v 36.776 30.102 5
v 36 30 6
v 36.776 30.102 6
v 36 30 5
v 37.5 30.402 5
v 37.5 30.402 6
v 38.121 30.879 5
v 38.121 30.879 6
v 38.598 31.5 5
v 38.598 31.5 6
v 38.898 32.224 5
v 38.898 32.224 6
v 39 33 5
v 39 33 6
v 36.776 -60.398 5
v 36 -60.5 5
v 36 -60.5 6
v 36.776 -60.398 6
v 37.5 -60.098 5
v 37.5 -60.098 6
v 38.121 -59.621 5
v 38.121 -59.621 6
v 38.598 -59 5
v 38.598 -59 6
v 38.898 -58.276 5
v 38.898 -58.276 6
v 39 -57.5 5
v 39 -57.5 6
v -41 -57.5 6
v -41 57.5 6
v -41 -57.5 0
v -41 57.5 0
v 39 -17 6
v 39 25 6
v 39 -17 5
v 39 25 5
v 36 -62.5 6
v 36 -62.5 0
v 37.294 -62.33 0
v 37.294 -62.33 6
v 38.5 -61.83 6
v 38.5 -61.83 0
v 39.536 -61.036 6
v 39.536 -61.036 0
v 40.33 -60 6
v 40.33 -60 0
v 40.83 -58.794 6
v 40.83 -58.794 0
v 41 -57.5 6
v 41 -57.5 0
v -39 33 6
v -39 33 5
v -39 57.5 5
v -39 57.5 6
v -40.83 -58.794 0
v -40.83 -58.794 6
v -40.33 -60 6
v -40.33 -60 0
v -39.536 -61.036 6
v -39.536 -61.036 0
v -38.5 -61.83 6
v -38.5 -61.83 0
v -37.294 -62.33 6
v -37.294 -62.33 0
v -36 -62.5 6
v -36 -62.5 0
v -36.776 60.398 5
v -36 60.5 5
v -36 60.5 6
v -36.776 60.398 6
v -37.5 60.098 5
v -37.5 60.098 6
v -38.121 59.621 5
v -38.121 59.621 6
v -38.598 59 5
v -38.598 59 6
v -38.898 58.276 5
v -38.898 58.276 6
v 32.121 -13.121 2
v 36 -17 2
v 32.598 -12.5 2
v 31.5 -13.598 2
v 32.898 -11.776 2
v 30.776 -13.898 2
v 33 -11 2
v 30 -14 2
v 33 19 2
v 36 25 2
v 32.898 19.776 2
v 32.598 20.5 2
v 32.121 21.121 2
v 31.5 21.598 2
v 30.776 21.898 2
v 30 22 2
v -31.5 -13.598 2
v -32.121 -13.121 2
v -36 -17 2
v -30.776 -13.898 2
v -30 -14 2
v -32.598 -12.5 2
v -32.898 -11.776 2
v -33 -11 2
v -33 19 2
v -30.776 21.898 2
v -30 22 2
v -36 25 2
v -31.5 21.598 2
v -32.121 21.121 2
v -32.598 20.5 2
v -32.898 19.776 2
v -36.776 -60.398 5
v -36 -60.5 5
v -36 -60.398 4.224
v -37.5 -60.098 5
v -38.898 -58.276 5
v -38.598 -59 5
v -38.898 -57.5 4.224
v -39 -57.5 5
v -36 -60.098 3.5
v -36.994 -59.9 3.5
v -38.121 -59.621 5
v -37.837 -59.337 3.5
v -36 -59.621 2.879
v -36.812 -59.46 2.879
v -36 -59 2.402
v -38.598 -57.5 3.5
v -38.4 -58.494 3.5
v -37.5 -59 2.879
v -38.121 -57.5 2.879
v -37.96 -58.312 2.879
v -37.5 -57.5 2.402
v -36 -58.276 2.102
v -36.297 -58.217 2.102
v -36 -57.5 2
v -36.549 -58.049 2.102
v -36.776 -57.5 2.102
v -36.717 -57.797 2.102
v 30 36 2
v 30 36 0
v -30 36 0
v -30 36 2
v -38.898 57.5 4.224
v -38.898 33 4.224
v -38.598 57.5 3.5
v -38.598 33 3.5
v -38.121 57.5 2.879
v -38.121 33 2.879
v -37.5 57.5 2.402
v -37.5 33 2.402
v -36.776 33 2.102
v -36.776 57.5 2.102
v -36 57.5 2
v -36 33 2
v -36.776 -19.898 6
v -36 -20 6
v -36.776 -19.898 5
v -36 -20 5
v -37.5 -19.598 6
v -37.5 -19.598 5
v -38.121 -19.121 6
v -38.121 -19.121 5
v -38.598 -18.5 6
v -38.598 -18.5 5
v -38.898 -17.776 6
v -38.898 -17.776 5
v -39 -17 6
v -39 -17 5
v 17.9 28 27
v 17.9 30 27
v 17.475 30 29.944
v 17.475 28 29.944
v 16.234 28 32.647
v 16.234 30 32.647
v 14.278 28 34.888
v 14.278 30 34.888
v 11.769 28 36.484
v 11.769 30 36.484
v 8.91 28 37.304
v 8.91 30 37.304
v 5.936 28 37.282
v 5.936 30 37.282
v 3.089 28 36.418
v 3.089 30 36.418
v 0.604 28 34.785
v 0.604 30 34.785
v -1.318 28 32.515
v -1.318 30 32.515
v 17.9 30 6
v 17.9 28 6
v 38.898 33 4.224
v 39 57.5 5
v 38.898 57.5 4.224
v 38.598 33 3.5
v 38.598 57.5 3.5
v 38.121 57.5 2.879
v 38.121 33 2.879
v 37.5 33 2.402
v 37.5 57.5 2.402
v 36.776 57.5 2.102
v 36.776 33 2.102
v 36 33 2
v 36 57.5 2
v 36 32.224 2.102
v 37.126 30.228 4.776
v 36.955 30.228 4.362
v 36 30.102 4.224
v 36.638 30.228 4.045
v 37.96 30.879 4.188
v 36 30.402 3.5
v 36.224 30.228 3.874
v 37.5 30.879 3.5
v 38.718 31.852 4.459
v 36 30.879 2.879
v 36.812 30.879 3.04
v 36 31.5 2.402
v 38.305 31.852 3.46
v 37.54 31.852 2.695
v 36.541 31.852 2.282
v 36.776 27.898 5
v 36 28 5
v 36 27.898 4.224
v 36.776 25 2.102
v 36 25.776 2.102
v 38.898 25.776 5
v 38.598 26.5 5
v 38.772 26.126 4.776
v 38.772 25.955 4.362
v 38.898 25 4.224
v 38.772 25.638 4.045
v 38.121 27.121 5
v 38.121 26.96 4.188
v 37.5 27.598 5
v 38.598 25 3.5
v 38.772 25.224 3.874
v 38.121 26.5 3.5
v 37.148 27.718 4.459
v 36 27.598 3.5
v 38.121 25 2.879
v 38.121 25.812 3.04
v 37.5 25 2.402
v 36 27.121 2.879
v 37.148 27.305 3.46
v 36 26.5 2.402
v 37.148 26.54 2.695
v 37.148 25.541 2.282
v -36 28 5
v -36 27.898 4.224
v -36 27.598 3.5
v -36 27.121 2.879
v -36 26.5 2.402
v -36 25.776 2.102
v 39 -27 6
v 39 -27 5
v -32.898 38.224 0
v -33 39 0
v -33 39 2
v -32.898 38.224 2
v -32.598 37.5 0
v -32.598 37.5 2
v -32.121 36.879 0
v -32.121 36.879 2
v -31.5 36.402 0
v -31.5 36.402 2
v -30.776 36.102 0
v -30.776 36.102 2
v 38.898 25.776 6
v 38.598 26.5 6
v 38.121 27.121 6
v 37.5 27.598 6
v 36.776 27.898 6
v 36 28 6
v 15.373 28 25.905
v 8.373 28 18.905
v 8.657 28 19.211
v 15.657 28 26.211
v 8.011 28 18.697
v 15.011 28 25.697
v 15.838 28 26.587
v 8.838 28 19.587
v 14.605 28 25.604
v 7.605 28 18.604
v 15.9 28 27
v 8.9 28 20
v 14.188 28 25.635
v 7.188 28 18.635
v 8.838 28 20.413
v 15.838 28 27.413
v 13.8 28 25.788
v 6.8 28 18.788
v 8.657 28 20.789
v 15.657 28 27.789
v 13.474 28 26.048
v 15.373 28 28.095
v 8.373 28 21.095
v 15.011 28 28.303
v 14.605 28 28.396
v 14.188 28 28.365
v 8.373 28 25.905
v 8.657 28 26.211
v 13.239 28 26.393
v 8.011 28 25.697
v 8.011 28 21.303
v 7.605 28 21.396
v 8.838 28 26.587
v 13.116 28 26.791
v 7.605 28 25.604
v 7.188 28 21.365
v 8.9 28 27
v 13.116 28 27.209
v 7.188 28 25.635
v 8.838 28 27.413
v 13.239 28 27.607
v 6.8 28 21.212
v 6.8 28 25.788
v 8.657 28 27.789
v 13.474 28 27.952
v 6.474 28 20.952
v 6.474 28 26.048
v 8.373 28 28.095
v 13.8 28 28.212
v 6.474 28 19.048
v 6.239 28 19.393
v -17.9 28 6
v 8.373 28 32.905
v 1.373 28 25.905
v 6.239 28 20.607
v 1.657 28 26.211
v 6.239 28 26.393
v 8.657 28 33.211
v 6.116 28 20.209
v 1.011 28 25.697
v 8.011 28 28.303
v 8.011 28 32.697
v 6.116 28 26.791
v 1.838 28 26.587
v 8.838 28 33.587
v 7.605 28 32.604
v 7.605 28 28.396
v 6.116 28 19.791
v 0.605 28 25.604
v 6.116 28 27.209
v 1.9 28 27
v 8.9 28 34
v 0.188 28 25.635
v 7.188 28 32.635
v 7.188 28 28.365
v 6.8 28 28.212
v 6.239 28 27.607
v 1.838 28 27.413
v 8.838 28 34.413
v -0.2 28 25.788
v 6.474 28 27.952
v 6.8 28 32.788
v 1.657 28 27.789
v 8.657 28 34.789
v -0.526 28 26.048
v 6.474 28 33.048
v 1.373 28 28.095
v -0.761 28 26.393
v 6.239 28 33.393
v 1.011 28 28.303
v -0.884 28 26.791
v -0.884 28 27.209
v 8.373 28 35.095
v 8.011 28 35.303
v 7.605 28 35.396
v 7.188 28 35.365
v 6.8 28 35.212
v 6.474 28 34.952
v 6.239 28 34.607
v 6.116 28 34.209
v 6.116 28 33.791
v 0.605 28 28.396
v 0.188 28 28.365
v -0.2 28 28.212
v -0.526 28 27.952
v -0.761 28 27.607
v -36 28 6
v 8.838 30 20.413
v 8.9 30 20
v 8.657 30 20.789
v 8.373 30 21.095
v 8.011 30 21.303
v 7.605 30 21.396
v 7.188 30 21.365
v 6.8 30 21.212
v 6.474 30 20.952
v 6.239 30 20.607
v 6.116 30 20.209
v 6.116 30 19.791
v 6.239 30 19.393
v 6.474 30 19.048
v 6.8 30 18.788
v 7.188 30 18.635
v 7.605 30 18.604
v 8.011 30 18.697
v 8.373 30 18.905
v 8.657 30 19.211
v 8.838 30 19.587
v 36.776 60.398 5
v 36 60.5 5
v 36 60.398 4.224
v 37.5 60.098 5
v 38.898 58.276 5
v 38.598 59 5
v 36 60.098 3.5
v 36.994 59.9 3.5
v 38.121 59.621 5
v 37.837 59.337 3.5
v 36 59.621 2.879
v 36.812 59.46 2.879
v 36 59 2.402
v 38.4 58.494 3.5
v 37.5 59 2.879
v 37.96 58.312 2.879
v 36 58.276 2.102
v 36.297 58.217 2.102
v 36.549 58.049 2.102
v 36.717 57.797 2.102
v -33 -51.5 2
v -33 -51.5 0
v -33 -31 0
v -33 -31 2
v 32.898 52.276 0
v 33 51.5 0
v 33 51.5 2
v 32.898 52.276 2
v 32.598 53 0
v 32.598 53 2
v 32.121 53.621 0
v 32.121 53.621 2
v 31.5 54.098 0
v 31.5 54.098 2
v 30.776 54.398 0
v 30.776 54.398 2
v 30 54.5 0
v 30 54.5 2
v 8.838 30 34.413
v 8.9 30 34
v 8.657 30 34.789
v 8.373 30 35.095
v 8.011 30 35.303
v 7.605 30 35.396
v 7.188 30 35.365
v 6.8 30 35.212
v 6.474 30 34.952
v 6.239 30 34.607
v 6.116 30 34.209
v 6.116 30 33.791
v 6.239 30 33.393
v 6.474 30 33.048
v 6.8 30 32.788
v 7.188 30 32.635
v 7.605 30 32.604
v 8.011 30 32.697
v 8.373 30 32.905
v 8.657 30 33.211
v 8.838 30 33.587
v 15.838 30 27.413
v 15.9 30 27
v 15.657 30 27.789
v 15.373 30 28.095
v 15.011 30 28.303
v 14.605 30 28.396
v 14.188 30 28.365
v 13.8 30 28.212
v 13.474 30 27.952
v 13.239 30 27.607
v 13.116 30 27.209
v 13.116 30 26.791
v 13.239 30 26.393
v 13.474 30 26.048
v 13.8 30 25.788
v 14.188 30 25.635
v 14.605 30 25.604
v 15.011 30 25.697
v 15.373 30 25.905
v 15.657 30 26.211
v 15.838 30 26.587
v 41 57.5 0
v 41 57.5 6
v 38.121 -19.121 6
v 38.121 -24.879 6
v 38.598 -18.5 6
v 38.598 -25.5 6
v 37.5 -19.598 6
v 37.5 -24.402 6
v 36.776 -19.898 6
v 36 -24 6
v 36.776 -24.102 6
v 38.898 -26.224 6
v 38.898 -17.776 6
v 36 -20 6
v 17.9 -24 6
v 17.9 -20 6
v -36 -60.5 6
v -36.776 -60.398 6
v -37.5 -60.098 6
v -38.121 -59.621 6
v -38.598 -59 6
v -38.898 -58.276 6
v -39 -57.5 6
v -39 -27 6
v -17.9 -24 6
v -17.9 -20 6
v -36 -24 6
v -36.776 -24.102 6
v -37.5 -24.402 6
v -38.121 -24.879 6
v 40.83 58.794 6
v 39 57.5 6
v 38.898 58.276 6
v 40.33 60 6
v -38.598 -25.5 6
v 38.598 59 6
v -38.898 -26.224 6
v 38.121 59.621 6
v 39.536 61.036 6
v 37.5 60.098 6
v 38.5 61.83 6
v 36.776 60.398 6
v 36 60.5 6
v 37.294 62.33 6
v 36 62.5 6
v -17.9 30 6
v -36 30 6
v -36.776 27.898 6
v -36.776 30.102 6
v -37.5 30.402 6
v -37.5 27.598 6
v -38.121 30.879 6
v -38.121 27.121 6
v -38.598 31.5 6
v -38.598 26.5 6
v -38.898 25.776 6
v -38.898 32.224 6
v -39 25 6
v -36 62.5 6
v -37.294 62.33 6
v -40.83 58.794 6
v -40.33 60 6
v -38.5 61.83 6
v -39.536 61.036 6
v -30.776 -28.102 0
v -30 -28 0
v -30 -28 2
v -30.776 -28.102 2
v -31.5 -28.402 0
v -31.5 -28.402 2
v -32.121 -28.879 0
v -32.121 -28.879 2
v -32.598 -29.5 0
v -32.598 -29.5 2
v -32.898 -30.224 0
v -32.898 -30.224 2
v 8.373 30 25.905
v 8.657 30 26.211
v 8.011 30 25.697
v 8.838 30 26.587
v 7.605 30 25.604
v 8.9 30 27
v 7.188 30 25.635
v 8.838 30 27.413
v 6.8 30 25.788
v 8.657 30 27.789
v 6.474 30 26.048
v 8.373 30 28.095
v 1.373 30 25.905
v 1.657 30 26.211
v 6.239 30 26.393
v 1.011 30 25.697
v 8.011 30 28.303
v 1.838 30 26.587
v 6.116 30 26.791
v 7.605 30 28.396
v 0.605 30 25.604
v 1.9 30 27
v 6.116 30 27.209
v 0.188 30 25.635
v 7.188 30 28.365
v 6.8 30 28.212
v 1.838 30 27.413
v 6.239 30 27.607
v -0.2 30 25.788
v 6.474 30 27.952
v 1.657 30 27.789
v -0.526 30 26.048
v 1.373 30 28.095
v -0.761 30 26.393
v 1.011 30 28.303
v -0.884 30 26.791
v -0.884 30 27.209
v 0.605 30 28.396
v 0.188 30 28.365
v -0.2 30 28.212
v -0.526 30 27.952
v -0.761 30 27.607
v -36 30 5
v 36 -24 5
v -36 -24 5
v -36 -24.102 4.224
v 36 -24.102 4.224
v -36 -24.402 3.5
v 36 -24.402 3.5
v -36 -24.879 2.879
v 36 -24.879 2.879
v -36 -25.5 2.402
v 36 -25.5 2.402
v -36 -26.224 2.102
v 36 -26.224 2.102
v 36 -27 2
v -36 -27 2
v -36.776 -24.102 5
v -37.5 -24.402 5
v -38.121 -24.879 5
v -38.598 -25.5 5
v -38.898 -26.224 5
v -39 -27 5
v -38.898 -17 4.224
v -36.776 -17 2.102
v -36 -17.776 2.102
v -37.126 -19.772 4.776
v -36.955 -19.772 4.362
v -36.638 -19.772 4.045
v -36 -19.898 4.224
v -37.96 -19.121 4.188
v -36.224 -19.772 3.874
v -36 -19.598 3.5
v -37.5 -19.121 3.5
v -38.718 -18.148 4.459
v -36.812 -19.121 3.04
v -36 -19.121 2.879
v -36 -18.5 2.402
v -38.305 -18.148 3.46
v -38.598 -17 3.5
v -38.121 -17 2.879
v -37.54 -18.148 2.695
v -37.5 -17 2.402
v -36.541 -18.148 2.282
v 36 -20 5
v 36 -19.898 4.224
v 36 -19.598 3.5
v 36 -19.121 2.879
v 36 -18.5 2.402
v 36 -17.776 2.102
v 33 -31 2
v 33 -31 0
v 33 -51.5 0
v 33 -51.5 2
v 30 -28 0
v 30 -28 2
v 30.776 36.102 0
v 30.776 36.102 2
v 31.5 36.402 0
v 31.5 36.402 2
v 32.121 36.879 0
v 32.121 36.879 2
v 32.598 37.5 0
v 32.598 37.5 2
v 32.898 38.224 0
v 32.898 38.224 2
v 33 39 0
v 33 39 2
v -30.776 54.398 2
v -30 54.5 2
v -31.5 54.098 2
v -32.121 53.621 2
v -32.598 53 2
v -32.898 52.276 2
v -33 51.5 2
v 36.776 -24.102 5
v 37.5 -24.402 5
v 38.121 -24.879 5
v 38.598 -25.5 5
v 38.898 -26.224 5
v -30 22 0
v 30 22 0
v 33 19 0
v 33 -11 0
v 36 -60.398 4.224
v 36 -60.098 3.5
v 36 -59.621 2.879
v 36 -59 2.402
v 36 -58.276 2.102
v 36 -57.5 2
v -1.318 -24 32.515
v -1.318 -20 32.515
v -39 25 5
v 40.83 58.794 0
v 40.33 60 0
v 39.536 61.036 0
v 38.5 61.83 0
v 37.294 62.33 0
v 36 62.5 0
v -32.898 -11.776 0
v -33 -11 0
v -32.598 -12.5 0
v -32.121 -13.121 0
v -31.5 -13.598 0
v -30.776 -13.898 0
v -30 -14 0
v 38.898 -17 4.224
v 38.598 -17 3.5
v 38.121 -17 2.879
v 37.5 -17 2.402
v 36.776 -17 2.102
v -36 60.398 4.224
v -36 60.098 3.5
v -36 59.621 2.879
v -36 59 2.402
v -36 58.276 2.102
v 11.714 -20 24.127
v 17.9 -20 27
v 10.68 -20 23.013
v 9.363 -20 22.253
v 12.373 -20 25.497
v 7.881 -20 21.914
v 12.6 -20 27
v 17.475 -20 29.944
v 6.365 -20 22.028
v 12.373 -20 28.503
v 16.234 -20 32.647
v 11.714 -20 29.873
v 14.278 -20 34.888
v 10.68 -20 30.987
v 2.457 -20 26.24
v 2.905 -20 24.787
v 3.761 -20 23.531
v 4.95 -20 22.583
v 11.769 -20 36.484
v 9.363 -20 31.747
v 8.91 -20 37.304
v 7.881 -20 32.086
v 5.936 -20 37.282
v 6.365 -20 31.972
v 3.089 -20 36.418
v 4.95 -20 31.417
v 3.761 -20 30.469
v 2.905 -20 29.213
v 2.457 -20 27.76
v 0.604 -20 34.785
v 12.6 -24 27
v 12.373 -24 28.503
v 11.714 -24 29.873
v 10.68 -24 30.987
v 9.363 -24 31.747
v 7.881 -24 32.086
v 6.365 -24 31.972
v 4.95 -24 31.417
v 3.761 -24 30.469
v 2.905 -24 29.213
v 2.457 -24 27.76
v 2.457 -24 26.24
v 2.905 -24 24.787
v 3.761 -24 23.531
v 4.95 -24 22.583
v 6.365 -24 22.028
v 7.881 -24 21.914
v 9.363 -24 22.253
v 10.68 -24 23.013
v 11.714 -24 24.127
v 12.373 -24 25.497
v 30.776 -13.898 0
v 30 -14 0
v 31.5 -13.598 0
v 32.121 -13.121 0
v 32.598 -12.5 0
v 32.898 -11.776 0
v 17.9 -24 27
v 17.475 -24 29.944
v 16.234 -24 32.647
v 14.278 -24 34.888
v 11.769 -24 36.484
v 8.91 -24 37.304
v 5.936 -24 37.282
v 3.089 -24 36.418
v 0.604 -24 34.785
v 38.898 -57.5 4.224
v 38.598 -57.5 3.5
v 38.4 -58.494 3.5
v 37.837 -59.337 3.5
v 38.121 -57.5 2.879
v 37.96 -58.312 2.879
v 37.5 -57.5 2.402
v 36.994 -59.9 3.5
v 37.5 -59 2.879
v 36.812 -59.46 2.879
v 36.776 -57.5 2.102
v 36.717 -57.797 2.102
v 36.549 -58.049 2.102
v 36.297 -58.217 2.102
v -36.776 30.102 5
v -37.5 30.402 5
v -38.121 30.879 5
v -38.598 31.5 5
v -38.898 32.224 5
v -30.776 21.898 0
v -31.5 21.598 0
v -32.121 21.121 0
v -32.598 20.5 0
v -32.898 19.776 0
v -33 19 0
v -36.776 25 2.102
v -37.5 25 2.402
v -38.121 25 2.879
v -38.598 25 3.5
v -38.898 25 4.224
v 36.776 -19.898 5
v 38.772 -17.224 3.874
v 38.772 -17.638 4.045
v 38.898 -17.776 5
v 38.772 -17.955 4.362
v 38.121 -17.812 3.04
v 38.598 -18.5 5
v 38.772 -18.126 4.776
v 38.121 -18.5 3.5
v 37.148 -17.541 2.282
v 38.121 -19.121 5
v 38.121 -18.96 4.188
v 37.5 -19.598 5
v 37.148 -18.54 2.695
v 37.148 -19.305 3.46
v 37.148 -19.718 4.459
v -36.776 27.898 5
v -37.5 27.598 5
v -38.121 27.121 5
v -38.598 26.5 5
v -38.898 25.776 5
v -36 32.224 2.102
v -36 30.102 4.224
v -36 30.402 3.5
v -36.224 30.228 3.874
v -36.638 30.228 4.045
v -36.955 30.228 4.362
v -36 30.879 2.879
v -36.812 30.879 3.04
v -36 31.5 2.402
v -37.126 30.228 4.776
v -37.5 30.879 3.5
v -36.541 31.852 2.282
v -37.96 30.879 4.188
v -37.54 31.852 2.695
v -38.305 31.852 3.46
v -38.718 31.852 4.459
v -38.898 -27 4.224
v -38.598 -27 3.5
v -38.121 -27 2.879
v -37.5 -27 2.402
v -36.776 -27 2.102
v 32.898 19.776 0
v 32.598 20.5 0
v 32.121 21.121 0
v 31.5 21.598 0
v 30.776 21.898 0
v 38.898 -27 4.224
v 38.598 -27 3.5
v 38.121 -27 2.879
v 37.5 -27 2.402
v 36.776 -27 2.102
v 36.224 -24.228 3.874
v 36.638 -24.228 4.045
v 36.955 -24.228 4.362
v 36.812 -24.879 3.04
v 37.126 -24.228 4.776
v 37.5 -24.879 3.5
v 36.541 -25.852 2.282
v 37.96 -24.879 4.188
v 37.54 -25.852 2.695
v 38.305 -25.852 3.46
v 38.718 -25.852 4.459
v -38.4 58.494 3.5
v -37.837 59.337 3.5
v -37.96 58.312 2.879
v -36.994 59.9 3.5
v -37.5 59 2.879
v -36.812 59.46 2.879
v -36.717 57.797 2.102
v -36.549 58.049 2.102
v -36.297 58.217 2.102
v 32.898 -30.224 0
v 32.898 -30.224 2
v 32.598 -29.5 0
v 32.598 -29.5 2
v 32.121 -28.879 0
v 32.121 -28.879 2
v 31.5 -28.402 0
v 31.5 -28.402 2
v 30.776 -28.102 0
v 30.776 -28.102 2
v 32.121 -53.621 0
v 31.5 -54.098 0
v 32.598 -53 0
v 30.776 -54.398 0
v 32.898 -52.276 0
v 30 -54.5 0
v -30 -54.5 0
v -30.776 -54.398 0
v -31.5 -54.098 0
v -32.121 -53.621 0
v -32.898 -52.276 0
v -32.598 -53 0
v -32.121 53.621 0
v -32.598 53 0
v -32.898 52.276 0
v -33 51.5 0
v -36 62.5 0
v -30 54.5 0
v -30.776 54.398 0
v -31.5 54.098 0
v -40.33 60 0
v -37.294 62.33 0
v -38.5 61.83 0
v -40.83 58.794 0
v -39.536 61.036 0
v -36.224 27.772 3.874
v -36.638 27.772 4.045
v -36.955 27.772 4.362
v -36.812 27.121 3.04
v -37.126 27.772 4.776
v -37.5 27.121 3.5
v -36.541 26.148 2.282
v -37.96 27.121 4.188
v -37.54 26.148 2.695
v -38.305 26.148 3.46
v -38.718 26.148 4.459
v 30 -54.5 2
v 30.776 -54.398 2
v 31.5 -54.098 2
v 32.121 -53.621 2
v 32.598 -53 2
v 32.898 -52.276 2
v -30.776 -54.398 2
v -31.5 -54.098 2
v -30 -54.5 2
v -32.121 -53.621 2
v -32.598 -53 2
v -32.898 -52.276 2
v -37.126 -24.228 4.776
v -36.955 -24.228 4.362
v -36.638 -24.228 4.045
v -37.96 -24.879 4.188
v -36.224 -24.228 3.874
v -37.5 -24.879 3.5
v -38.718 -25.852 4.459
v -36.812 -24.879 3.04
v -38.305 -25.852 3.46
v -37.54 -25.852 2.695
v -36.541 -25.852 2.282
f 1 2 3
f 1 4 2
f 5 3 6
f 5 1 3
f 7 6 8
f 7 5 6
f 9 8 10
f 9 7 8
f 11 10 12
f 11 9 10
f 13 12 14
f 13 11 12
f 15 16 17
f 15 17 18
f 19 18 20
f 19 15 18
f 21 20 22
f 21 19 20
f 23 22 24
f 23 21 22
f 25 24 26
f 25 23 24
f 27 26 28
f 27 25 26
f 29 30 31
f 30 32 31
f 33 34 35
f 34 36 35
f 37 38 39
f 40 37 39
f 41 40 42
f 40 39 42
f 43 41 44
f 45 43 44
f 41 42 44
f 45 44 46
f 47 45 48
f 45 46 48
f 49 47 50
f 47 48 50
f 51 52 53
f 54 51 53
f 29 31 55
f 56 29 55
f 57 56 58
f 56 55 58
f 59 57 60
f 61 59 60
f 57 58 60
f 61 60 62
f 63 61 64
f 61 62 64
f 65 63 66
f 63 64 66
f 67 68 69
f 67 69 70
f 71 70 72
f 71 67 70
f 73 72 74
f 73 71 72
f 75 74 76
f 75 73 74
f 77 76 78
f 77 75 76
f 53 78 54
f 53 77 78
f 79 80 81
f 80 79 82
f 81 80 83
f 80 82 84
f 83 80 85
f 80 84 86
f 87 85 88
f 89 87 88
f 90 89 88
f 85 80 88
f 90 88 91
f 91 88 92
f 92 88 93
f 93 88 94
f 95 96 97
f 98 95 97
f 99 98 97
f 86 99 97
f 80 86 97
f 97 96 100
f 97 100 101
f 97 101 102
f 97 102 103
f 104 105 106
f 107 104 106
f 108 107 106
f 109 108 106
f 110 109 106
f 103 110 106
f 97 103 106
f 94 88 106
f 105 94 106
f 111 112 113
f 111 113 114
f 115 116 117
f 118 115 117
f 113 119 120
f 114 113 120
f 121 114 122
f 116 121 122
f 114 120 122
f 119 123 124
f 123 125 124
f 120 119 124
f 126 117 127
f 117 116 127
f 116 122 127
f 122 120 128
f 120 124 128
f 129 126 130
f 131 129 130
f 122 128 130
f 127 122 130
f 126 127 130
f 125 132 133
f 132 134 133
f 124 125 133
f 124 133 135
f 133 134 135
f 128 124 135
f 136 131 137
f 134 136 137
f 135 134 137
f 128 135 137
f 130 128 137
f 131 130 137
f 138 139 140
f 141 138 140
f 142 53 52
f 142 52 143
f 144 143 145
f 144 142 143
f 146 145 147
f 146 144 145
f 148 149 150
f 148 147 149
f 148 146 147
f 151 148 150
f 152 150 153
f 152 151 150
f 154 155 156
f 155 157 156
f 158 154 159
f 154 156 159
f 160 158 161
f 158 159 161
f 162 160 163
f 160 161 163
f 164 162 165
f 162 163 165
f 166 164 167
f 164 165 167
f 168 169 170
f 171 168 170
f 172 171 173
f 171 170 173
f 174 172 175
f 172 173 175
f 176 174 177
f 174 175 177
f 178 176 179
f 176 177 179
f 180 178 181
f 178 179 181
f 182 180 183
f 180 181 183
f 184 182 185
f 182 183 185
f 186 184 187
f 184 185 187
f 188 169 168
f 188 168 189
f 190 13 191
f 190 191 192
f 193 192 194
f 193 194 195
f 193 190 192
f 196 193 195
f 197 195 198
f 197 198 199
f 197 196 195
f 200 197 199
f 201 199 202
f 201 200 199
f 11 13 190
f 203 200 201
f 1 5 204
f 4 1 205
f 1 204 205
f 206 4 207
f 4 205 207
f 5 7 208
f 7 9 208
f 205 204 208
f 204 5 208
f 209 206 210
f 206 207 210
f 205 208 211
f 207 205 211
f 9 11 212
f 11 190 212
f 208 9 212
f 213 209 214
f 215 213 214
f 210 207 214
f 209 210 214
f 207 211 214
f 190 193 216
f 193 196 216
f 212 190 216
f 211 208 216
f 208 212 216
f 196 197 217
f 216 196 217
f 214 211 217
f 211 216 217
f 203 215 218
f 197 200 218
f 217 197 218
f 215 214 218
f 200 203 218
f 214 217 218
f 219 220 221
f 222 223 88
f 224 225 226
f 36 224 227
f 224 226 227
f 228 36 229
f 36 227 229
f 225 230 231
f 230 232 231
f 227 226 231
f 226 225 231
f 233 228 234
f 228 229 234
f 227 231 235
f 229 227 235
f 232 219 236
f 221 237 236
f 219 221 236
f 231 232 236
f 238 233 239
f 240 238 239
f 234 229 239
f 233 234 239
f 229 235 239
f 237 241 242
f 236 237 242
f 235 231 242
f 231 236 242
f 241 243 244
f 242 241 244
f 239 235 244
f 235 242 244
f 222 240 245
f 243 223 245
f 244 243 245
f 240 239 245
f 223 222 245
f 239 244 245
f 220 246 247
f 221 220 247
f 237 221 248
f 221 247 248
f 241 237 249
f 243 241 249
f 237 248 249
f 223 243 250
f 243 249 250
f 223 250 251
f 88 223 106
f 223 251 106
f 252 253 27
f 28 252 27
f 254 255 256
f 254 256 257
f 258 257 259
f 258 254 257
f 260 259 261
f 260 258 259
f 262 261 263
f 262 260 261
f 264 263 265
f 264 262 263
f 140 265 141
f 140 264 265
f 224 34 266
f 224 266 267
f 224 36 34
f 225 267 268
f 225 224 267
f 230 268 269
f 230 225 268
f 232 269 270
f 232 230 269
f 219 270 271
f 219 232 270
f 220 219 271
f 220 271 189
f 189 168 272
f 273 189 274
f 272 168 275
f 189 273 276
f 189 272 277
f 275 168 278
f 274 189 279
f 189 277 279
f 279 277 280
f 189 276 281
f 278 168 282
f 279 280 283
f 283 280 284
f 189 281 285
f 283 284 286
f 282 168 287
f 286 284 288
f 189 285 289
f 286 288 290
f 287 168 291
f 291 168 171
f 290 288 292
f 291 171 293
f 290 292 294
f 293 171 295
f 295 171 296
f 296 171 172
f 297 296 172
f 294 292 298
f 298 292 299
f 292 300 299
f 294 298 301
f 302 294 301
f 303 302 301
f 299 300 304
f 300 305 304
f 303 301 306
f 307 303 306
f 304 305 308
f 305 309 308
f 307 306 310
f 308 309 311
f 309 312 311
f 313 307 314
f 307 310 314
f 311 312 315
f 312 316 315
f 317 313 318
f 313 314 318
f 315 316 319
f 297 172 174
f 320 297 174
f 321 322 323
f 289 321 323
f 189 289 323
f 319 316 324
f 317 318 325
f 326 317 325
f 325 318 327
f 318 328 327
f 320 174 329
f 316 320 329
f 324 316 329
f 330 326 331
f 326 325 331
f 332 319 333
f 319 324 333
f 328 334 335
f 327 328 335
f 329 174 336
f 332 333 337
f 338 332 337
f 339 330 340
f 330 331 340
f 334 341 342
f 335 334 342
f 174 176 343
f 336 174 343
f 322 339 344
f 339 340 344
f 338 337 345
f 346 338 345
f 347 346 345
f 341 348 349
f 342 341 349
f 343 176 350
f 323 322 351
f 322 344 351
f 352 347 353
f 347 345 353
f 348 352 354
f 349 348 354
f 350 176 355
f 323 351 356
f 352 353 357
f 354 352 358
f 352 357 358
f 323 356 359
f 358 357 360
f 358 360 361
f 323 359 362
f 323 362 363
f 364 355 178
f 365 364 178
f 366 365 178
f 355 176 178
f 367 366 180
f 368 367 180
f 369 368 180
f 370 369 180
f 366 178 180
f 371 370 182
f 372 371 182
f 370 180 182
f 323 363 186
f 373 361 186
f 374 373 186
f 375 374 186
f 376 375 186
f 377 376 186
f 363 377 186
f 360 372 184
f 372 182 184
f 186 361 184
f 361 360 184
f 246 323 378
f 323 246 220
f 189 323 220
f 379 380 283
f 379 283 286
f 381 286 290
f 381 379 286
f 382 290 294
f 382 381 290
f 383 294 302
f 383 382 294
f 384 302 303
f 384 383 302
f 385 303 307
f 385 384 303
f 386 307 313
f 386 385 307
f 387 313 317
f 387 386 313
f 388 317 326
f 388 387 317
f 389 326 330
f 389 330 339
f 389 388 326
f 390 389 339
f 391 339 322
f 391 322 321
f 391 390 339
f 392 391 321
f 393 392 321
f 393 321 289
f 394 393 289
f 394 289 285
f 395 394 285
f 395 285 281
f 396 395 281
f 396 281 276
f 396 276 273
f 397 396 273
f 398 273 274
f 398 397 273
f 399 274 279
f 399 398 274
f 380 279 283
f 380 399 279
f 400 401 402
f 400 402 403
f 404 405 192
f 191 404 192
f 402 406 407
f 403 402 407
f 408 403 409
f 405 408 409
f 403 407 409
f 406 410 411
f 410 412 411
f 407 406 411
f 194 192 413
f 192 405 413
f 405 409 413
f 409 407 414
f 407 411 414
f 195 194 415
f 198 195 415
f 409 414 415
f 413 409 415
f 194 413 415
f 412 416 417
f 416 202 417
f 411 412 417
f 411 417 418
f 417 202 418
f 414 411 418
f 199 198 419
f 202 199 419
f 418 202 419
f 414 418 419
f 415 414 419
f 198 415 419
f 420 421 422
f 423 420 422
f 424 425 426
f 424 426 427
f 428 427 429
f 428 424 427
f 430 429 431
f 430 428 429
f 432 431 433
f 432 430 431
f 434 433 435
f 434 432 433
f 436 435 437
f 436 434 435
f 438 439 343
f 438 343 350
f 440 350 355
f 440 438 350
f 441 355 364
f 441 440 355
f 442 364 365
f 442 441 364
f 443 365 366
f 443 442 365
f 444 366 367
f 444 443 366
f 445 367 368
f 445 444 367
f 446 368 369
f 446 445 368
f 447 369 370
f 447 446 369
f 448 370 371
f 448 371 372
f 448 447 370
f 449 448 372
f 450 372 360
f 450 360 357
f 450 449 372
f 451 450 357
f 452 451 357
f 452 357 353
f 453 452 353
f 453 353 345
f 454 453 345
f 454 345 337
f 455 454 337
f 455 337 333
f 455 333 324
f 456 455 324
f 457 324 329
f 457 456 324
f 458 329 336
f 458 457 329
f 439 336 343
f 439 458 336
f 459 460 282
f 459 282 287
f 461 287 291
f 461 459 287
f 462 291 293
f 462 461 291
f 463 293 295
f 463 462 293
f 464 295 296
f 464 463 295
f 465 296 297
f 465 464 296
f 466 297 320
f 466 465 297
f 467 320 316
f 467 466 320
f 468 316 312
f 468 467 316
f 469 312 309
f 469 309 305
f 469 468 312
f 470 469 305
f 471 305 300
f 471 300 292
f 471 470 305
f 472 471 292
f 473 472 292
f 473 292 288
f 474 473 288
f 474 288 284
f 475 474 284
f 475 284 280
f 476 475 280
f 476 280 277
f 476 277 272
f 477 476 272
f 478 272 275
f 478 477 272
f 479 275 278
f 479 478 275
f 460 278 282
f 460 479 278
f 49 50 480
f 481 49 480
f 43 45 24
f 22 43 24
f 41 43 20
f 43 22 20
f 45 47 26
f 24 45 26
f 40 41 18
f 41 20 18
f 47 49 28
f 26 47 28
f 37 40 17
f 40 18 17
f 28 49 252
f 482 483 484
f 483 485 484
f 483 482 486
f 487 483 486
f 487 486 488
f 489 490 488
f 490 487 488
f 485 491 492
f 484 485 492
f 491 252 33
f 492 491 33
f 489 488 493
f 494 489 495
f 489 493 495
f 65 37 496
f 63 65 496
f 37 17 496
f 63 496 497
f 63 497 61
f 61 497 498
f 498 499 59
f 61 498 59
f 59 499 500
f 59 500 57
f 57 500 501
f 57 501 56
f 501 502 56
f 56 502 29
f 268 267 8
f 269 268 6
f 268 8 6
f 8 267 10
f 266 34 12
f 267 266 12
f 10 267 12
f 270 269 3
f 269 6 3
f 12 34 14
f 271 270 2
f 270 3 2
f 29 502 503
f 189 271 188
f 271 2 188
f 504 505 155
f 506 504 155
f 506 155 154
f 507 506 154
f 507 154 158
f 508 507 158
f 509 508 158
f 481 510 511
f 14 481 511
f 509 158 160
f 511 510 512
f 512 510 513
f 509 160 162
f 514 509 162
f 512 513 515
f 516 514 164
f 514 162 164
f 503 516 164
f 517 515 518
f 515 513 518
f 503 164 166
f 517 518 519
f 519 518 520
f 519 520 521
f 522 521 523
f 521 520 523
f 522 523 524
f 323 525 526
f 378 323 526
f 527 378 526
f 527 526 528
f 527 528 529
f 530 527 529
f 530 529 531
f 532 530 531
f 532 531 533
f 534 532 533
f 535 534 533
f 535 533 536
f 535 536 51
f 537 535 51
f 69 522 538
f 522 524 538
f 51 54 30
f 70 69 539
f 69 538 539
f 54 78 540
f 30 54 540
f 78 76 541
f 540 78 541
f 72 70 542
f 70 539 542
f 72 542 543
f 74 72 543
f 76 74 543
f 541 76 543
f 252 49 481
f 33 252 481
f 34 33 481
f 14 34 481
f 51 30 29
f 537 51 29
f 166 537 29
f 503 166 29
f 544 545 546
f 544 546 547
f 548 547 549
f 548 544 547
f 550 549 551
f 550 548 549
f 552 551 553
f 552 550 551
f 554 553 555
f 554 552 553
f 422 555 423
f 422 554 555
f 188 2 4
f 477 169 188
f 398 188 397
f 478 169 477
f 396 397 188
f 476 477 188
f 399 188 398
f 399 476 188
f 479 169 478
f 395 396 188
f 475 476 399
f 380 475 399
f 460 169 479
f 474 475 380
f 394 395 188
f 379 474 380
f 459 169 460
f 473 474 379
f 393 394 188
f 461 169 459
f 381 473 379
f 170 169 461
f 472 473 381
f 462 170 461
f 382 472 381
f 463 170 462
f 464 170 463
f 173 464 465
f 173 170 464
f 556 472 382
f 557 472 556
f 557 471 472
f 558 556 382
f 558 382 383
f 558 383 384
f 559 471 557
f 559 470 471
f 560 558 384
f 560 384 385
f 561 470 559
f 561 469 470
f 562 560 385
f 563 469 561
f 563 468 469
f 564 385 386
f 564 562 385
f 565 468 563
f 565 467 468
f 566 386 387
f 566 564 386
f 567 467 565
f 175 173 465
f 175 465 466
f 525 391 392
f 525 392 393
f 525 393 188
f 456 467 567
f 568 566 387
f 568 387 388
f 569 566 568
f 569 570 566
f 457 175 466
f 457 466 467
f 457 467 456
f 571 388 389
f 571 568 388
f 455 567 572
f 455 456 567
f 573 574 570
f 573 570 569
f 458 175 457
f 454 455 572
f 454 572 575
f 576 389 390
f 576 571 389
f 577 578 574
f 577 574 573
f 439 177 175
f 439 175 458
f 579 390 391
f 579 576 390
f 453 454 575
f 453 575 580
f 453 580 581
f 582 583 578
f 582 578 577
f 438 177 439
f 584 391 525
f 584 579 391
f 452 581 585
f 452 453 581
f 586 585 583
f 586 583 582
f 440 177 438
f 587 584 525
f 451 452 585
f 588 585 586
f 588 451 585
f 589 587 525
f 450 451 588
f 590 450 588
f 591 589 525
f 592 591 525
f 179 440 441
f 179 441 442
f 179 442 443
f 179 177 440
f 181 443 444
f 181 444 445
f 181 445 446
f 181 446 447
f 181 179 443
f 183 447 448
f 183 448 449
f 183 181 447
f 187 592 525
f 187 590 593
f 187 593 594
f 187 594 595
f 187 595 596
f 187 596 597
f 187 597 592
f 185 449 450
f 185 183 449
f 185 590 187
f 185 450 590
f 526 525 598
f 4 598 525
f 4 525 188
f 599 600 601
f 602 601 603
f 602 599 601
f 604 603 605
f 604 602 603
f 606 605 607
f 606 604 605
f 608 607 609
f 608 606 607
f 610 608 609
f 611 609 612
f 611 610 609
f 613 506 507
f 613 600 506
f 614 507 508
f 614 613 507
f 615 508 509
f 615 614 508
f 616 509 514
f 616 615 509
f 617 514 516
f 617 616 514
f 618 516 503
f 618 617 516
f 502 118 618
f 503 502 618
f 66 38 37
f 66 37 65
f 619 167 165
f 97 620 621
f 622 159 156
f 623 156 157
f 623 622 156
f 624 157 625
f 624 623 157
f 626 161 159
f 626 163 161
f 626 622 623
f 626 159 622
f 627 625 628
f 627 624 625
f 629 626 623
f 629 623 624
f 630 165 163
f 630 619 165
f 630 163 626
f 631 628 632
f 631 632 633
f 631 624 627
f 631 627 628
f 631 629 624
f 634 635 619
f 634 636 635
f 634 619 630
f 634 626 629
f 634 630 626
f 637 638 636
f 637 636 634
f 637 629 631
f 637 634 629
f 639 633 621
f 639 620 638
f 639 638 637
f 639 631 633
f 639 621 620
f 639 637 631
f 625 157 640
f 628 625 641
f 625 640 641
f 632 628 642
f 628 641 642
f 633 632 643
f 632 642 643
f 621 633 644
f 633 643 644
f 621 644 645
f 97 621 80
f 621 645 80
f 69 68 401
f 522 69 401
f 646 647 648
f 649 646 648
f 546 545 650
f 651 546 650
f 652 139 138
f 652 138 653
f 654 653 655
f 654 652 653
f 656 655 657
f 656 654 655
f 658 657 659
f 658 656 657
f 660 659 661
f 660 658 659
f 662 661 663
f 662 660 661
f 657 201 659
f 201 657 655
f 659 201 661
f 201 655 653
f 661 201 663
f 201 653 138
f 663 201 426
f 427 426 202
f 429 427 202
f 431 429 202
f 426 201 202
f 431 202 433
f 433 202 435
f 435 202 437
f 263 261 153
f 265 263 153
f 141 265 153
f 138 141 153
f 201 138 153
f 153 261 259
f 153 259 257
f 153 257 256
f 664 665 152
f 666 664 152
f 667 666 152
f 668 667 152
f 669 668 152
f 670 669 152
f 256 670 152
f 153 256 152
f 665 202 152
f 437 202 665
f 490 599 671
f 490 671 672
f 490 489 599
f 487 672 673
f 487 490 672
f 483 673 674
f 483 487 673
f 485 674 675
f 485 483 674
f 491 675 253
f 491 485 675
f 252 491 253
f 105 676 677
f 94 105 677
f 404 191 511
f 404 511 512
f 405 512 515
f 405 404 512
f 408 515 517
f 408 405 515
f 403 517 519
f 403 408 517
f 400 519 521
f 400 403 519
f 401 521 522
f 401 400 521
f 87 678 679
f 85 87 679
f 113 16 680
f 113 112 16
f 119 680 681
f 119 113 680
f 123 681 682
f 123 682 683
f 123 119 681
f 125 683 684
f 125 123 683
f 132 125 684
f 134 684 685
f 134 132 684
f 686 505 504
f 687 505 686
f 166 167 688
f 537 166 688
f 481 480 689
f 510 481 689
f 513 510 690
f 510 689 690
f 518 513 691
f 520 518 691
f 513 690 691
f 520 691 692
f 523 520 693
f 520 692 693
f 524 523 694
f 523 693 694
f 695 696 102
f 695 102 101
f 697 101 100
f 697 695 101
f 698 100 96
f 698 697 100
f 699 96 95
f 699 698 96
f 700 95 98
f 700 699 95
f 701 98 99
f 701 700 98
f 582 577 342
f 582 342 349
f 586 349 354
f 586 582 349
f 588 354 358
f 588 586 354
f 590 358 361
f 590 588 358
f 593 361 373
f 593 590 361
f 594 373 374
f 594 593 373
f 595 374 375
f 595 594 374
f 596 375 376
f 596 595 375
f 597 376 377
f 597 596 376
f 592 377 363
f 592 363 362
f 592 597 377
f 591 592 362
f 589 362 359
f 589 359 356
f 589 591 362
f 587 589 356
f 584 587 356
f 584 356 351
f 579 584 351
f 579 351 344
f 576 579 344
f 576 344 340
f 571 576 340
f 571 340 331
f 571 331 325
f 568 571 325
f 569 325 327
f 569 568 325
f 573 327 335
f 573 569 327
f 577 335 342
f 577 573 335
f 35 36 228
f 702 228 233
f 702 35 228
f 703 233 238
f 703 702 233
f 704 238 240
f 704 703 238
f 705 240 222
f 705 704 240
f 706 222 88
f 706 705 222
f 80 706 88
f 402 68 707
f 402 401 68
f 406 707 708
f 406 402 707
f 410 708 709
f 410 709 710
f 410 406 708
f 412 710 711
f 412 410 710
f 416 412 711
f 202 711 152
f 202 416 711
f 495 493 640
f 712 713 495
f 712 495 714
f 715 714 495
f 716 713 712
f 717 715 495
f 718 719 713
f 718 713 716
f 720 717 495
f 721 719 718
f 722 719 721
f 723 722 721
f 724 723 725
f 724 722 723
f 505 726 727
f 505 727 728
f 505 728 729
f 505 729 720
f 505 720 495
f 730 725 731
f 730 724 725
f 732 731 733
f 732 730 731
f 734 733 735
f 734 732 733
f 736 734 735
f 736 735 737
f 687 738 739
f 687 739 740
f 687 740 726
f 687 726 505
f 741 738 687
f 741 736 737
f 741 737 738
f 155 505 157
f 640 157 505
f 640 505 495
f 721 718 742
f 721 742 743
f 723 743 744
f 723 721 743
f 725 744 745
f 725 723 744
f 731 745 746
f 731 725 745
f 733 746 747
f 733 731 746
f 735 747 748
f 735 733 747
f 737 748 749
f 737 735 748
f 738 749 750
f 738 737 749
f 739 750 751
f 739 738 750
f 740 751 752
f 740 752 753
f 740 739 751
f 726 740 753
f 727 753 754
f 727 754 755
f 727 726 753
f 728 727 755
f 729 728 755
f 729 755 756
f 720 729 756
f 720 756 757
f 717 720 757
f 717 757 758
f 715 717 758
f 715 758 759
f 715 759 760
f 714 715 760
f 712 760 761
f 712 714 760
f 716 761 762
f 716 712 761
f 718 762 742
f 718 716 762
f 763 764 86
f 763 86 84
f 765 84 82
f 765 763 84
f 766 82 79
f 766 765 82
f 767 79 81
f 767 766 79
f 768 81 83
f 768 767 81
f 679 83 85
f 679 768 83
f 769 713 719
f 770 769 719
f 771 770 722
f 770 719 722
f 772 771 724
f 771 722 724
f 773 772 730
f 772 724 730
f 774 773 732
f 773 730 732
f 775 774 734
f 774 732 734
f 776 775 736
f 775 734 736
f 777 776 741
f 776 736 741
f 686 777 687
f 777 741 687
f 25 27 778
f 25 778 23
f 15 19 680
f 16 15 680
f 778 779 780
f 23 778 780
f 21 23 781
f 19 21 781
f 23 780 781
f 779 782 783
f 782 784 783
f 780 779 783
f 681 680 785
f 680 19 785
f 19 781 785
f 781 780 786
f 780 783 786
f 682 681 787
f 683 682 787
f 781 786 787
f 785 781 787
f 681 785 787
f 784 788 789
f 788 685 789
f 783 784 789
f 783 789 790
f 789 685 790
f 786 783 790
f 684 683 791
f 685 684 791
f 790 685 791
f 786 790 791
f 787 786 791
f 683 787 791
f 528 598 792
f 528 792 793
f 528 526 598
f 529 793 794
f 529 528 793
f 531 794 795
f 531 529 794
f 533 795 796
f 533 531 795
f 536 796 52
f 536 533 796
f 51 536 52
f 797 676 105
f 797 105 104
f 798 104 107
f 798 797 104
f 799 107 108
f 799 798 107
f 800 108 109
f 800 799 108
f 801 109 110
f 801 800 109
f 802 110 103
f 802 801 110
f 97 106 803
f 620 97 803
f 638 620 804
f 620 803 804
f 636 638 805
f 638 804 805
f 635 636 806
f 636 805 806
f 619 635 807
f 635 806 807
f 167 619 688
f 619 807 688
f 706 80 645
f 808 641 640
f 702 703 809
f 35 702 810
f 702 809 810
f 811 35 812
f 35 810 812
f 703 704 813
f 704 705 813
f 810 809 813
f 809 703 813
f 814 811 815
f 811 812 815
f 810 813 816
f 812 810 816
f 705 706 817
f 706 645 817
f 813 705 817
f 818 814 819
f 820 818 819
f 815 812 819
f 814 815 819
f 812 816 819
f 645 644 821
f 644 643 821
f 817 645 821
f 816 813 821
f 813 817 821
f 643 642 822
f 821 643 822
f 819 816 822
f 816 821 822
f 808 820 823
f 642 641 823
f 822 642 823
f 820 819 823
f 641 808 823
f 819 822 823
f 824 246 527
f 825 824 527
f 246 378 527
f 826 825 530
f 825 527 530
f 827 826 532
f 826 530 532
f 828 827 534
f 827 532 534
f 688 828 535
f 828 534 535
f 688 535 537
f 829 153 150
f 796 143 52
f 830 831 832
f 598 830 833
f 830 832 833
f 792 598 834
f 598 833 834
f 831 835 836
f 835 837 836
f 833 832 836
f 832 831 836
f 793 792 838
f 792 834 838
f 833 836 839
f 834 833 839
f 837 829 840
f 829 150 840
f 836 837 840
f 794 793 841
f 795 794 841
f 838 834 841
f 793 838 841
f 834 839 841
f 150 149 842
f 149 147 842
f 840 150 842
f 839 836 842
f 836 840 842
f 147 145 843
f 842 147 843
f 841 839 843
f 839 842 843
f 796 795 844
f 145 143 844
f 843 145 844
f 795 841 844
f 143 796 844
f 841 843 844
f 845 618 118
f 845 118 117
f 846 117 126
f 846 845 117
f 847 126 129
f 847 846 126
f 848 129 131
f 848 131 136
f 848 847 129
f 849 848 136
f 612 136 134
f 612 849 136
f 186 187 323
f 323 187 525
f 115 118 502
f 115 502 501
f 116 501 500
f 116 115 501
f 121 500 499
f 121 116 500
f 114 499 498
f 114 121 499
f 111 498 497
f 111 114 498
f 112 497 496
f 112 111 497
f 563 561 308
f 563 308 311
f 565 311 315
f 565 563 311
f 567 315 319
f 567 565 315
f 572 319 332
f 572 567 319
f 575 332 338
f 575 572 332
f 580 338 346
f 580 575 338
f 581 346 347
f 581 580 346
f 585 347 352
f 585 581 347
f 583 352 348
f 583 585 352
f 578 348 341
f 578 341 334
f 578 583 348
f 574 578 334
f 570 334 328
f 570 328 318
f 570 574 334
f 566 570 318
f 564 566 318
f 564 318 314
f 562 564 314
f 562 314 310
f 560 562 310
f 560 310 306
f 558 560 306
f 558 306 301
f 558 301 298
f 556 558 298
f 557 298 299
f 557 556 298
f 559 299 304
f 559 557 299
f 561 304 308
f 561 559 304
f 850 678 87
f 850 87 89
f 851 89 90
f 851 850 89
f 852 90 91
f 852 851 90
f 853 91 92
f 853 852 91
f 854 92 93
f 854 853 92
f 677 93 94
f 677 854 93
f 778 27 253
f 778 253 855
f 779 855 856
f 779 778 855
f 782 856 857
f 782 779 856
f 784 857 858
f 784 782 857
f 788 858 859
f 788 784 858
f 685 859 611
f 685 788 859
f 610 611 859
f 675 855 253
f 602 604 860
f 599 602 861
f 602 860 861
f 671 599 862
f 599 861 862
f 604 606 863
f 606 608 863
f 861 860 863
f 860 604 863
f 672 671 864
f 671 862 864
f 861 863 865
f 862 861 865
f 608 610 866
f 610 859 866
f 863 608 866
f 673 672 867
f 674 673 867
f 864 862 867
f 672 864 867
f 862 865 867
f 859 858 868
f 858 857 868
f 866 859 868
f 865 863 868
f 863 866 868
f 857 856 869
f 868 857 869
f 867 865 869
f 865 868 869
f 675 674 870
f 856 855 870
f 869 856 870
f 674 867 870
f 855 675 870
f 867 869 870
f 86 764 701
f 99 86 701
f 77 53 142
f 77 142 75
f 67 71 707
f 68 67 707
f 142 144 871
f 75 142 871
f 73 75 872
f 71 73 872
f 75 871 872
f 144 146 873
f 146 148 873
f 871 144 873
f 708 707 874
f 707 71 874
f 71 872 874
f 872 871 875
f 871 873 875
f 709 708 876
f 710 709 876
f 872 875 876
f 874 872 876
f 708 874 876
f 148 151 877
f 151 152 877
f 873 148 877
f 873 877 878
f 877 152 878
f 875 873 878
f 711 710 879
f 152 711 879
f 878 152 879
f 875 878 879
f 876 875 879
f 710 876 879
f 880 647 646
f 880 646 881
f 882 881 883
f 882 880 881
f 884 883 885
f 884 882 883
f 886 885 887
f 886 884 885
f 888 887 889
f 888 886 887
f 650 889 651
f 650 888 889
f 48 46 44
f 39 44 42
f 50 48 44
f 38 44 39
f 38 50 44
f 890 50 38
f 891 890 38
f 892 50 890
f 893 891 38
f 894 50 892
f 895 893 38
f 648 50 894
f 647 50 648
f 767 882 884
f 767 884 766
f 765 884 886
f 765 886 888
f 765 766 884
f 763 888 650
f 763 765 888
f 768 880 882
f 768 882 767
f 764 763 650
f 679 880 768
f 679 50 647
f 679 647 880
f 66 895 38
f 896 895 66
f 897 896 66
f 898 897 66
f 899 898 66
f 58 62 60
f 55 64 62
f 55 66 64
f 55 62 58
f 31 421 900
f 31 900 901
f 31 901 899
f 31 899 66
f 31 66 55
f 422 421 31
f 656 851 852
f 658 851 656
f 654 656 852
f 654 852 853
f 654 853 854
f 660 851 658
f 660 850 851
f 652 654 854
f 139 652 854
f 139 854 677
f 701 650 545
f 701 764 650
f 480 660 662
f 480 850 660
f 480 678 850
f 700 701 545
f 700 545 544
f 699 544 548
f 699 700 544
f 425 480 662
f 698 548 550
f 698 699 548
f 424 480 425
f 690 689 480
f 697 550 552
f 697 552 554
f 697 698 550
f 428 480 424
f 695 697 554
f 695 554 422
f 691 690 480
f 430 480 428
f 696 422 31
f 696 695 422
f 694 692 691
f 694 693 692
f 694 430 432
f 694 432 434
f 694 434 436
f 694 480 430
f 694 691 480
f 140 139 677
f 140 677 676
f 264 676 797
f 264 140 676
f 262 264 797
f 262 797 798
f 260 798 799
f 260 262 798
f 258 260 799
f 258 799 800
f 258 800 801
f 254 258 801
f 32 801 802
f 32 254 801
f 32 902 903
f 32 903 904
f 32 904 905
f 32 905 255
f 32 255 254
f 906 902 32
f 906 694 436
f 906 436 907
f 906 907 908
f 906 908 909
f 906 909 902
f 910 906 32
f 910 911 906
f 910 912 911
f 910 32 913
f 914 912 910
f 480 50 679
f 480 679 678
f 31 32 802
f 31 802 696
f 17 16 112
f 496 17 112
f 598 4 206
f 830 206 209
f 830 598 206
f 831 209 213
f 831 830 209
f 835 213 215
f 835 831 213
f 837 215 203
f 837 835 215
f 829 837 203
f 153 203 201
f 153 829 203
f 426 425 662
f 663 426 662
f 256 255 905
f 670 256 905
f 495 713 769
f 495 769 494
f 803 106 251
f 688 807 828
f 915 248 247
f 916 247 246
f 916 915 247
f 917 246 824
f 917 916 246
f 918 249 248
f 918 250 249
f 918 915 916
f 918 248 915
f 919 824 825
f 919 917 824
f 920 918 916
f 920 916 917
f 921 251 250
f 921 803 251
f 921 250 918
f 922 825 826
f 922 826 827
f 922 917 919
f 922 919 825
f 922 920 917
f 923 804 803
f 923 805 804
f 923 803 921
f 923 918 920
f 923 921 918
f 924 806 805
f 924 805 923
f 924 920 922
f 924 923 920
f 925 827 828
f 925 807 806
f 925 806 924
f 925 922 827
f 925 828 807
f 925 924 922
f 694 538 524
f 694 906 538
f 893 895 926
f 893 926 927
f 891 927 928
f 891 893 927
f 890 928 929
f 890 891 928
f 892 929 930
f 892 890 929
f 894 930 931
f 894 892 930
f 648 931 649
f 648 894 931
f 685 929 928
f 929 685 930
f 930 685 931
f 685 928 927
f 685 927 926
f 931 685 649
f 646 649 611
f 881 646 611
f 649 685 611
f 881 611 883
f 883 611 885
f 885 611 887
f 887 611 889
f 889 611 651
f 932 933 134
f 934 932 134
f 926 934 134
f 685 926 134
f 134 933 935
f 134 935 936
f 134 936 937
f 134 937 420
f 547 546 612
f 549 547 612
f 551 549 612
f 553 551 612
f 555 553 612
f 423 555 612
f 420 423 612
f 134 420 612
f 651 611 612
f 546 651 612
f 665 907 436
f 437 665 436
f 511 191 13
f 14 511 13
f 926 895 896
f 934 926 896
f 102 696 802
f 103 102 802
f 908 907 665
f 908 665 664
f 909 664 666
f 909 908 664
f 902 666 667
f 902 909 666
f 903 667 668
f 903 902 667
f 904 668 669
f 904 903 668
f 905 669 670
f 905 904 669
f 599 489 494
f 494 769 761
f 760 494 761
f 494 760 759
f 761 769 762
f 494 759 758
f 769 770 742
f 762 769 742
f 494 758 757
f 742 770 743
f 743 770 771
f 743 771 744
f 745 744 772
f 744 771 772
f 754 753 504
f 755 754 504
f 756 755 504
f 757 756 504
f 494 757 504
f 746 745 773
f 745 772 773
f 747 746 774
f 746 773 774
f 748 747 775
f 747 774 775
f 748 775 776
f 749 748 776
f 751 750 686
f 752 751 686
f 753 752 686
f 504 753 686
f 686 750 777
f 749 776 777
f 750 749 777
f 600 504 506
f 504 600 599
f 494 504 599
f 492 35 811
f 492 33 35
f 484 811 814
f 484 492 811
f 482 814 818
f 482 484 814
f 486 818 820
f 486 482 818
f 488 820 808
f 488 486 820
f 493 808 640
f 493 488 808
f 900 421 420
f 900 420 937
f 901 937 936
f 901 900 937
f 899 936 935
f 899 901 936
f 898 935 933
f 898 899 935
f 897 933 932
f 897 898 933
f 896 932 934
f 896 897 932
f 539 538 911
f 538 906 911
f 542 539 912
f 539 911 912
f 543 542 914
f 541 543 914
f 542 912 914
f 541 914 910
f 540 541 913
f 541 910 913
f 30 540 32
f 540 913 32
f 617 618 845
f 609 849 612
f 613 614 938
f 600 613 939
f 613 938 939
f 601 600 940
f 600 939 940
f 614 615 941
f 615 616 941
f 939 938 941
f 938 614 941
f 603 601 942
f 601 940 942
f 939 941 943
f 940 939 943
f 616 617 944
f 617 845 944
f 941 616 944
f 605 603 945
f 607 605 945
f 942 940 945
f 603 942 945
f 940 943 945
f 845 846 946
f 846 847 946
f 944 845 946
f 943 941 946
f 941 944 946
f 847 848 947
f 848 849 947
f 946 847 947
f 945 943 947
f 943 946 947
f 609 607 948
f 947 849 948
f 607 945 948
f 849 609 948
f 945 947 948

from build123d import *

# Parameters (mm, degrees)
PAD_DEPTH    = 2
SKETCH001_R  = 5.1
PAD001_DEPTH = 4
SKETCH003_R  = 1.4
PAD003_DEPTH = 2
PAD004_DEPTH = 4
FILLET_R     = 3
FILLET001_R  = 3
FILLET002_R  = 3
FILLET003_R  = 3
FILLET004_R  = 3
FILLET005_R  = 3
FILLET006_R  = 3
FILLET007_R  = 3


with BuildPart() as part:
    # Sketch → Pad (new body)
    with BuildSketch(Plane.XY):
        with BuildLine():
            Line((-36, 62.5), (36, 62.5))
            ThreePointArc((41, 57.5), (39.535534, 61.035534), (36, 62.5))
            Line((41, 57.5), (41, -57.5))
            ThreePointArc((36, -62.5), (39.535534, -61.035534), (41, -57.5))
            Line((36, -62.5), (-36, -62.5))
            ThreePointArc((-41, -57.5), (-39.535534, -61.035534), (-36, -62.5))
            Line((-41, -57.5), (-41, 57.5))
            ThreePointArc((-36, 62.5), (-39.535534, 61.035534), (-41, 57.5))
        make_face()
        with BuildLine():
            ThreePointArc((-30, 54.5), (-32.12132, 53.62132), (-33, 51.5))
            Line((-33, 39), (-33, 51.5))
            ThreePointArc((-33, 39), (-32.12132, 36.87868), (-30, 36))
            Line((30, 36), (-30, 36))
            ThreePointArc((30, 36), (32.12132, 36.87868), (33, 39))
            Line((33, 51.5), (33, 39))
            ThreePointArc((33, 51.5), (32.12132, 53.62132), (30, 54.5))
            Line((-30, 54.5), (30, 54.5))
        make_face(mode=Mode.SUBTRACT)
        with BuildLine():
            ThreePointArc((-30, -28), (-32.12132, -28.87868), (-33, -31))
            Line((-33, -51.5), (-33, -31))
            ThreePointArc((-33, -51.5), (-32.12132, -53.62132), (-30, -54.5))
            Line((30, -54.5), (-30, -54.5))
            ThreePointArc((30, -54.5), (32.12132, -53.62132), (33, -51.5))
            Line((33, -31), (33, -51.5))
            ThreePointArc((33, -31), (32.12132, -28.87868), (30, -28))
            Line((-30, -28), (30, -28))
        make_face(mode=Mode.SUBTRACT)
        with BuildLine():
            ThreePointArc((-30, 22), (-32.12132, 21.12132), (-33, 19))
            Line((-33, -11), (-33, 19))
            ThreePointArc((-33, -11), (-32.12132, -13.12132), (-30, -14))
            Line((30, -14), (-30, -14))
            ThreePointArc((30, -14), (32.12132, -13.12132), (33, -11))
            Line((33, 19), (33, -11))
            ThreePointArc((33, 19), (32.12132, 21.12132), (30, 22))
            Line((-30, 22), (30, 22))
        make_face(mode=Mode.SUBTRACT)
    extrude(amount=PAD_DEPTH)

    # Sketch001 → Pad001 (join)
    with BuildSketch(Plane(origin=(7.5, -20, 0), x_dir=(1, 0, 0), z_dir=(0, -1, 0))):
        with BuildLine():
            Line((10.4, 27), (10.4, 6))
            Line((33.5, 6), (10.4, 6))
            Line((33.5, 2), (33.5, 6))
            Line((-48.5, 2), (33.5, 2))
            Line((-48.5, 6), (-48.5, 2))
            Line((-25.4, 6), (-48.5, 6))
            Line((-25.4, 6), (-8.817564, 32.514577))
            ThreePointArc((10.4, 27), (2.868565, 36.996566), (-8.817564, 32.514577))
        make_face()
        with Locations((0, 27)):
            Circle(SKETCH001_R, mode=Mode.SUBTRACT)
    extrude(amount=PAD001_DEPTH)

    # Sketch003 → Pad003 (join)
    with BuildSketch(Plane(origin=(7.5, 30, 0), x_dir=(1, 0, 0), z_dir=(0, -1, 0))):
        with BuildLine():
            Line((33.5, 2), (-48.5, 2))
            Line((-48.5, 6), (-48.5, 2))
            Line((-25.4, 6), (-48.5, 6))
            Line((-8.817564, 32.514577), (-25.4, 6))
            ThreePointArc((10.4, 27), (2.868565, 36.996566), (-8.817564, 32.514577))
            Line((10.4, 27), (10.4, 6))
            Line((10.4, 6), (33.5, 6))
            Line((33.5, 6), (33.5, 2))
        make_face()
        with Locations((0, 27)):
            Circle(SKETCH003_R, mode=Mode.SUBTRACT)
        with Locations((-7, 27)):
            Circle(SKETCH003_R, mode=Mode.SUBTRACT)
        with Locations((0, 20)):
            Circle(SKETCH003_R, mode=Mode.SUBTRACT)
        with Locations((7, 27)):
            Circle(SKETCH003_R, mode=Mode.SUBTRACT)
        with Locations((0, 34)):
            Circle(SKETCH003_R, mode=Mode.SUBTRACT)
    extrude(amount=PAD003_DEPTH)

    # Sketch004 (on Face5 of Pad003) → Pad004 (join)
    with BuildSketch(Plane.XY.offset(2)):
        with BuildLine():
            Line((-36, 62.5), (36, 62.5))
            ThreePointArc((41, 57.5), (39.535534, 61.035534), (36, 62.5))
            Line((41, -57.5), (41, 57.5))
            ThreePointArc((36, -62.5), (39.535534, -61.035534), (41, -57.5))
            Line((-36, -62.5), (36, -62.5))
            ThreePointArc((-41, -57.5), (-39.535534, -61.035534), (-36, -62.5))
            Line((-41, 57.5), (-41, -57.5))
            ThreePointArc((-36, 62.5), (-39.535534, 61.035534), (-41, 57.5))
        make_face()
        with BuildLine():
            Line((-36, 60.5), (36, 60.5))
            ThreePointArc((39, 57.5), (38.12132, 59.62132), (36, 60.5))
            Line((39, 57.5), (39, -57.5))
            ThreePointArc((36, -60.5), (38.12132, -59.62132), (39, -57.5))
            Line((36, -60.5), (-36, -60.5))
            ThreePointArc((-39, -57.5), (-38.12132, -59.62132), (-36, -60.5))
            Line((-39, -57.5), (-39, 57.5))
            ThreePointArc((-36, 60.5), (-38.12132, 59.62132), (-39, 57.5))
        make_face(mode=Mode.SUBTRACT)
    extrude(amount=PAD004_DEPTH)

    # Fillet
    fillet_edges = [part.edges().sort_by_distance(p)[0] for p in [
        (-39, 4, 2),
    ]]
    fillet(fillet_edges, radius=FILLET_R)

    # Fillet001
    fillet001_edges = [part.edges().sort_by_distance(p)[0] for p in [
        (-39, -40.75, 2),
    ]]
    fillet(fillet001_edges, radius=FILLET001_R)

    # Fillet002
    fillet002_edges = [part.edges().sort_by_distance(p)[0] for p in [
        (0, -24, 2),
    ]]
    fillet(fillet002_edges, radius=FILLET002_R)

    # Fillet003
    fillet003_edges = [part.edges().sort_by_distance(p)[0] for p in [
        (1.5, 28, 2),
    ]]
    fillet(fillet003_edges, radius=FILLET003_R)

    # Fillet004
    fillet004_edges = [part.edges().sort_by_distance(p)[0] for p in [
        (1.5, -20, 2),
    ]]
    fillet(fillet004_edges, radius=FILLET004_R)

    # Fillet005
    fillet005_edges = [part.edges().sort_by_distance(p)[0] for p in [
        (39, 4, 2),
    ]]
    fillet(fillet005_edges, radius=FILLET005_R)

    # Fillet006
    fillet006_edges = [part.edges().sort_by_distance(p)[0] for p in [
        (0, 60.5, 2),
    ]]
    fillet(fillet006_edges, radius=FILLET006_R)

    # Fillet007
    fillet007_edges = [part.edges().sort_by_distance(p)[0] for p in [
        (0, 30, 2),
    ]]
    fillet(fillet007_edges, radius=FILLET007_R)


solid = part.part
